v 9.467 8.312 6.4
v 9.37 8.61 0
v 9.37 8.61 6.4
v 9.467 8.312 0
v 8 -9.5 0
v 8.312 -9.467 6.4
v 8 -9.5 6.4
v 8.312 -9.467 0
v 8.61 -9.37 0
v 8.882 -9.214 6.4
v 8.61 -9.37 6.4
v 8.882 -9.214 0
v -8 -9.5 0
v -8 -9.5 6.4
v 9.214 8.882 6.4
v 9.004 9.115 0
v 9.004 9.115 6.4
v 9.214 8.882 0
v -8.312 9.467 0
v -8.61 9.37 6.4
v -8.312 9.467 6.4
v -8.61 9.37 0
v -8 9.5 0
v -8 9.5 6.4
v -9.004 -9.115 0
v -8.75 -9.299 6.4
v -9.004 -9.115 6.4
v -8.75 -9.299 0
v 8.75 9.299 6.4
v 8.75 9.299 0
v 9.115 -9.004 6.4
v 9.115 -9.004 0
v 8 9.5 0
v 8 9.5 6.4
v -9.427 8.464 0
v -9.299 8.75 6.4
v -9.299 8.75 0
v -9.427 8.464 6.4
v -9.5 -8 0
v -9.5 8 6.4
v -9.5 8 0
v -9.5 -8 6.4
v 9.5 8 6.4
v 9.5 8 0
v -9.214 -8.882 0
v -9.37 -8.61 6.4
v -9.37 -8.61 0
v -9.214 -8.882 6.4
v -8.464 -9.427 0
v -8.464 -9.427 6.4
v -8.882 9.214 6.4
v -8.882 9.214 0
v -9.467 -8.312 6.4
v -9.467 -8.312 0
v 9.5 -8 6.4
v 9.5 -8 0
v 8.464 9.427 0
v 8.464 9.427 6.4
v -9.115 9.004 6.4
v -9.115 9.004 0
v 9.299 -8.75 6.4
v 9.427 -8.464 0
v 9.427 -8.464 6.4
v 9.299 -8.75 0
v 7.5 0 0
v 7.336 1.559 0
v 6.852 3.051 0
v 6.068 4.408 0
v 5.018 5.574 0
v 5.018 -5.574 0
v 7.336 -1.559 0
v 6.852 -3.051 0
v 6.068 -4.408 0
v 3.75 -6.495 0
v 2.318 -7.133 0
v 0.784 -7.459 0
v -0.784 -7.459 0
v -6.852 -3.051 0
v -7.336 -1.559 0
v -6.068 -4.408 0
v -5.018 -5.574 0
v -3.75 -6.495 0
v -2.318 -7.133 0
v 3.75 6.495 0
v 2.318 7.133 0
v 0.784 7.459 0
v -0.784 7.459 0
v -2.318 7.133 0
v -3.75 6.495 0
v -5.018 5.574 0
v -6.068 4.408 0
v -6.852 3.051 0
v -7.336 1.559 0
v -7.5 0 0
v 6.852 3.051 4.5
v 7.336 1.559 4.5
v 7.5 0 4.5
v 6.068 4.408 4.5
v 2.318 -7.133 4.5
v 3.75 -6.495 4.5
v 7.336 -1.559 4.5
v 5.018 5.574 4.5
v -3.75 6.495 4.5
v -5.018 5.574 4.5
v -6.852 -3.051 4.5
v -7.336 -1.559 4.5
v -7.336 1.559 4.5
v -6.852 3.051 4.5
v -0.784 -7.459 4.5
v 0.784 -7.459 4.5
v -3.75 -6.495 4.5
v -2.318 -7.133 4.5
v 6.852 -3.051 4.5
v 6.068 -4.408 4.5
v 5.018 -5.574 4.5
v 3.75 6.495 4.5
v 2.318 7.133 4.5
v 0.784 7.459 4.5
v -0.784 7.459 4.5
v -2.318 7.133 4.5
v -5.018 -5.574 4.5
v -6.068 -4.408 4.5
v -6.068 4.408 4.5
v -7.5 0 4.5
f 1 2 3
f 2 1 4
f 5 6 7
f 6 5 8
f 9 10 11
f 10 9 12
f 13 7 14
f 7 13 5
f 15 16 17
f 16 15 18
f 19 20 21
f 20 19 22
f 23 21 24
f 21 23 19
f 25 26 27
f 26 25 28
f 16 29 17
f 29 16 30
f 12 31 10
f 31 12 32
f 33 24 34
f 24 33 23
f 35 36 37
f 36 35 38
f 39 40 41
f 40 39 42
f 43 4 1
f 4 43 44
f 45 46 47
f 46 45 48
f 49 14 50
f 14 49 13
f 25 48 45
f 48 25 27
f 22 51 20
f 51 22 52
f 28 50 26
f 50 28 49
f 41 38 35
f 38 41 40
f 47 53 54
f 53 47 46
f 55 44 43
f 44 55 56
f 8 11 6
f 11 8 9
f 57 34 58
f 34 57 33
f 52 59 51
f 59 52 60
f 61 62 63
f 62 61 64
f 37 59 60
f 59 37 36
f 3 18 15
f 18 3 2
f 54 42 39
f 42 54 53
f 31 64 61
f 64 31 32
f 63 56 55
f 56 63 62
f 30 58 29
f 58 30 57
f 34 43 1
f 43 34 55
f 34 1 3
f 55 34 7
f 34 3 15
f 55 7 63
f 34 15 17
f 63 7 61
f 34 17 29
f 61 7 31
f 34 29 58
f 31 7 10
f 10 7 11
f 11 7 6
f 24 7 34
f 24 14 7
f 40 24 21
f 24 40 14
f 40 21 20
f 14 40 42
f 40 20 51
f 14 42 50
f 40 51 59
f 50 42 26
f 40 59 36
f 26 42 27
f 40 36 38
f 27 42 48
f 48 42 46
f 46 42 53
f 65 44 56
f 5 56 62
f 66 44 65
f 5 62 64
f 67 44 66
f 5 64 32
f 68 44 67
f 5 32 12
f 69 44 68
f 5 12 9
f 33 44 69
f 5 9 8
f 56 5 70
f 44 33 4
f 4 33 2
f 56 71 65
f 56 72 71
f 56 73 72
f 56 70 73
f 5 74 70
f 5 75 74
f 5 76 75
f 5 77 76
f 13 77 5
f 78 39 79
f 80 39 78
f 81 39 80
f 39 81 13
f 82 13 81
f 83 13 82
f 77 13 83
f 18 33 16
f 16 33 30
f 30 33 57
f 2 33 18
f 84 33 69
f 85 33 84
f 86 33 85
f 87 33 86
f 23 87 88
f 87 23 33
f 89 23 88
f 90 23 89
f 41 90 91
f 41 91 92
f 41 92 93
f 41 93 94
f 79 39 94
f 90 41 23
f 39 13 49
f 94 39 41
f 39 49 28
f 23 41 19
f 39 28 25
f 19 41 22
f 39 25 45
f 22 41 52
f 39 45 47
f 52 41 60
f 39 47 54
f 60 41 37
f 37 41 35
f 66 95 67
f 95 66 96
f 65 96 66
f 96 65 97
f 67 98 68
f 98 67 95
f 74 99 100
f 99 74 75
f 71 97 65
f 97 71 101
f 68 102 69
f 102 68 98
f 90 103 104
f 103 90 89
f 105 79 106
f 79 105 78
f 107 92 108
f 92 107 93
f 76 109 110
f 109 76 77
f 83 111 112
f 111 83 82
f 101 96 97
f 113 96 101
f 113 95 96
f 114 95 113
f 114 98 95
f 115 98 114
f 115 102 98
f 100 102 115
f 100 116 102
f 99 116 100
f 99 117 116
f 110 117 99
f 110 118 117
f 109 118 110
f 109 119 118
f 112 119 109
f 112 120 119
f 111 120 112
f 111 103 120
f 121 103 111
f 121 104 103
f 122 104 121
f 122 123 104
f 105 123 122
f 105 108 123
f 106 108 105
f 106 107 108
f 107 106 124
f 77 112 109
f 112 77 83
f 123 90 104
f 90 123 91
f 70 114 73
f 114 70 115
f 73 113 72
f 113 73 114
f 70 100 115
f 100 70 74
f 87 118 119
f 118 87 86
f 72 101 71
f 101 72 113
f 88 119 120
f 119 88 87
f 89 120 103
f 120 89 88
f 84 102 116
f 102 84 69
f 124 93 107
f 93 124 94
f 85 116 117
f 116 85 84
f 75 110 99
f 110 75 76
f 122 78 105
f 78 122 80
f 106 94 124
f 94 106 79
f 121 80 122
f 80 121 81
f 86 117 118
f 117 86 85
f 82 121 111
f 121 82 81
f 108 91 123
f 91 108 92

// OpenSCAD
tile_size = 19;
tile_thickness = 6.4;
corner_radius = -1.5;
text_depth = 0.001;
score_txt_size=3.5;
letter_txt_size=9;
font="DejaVu Sans:style=Bold";

module letter(letter) {
  color("black")
    translate([0,1,tile_thickness - text_depth])
    linear_extrude(text_depth)
    text(letter, halign="center", valign="center", size=letter_txt_size, font=font);
}

module score(n) {
  color("black")
    translate([(tile_size/2)-1.5, -(tile_size/2)+1.5, tile_thickness - text_depth])
    linear_extrude(text_depth)
    text(n, halign="right", valign="bottom", size=score_txt_size, font=font);
}

module fillet(r) {
  offset(r = -r, $fn=30) {
    offset(delta = r) {
      children();
    }
  }
}

module blank() {
  difference() {
    linear_extrude(tile_thickness)
      fillet(r=corner_radius) {
        square(tile_size, center=true);
      }
    cylinder(h=4.5, r=7.5, $fn=30);
  }
}

letter = undef;
all = false;

// 2 blank tiles (scoring 0 points)
// 1 point: A ×19, N ×9, E ×8, I ×8, T ×5, U ×5, R ×4, O ×3, S ×3
// 2 points: K ×3, M ×3
// 3 points: D ×4, G ×3
// 4 points: L ×3, H ×2, P ×2
// 5 points: B ×4, Y ×2, F ×1, V ×1
// 8 points: C ×3, W ×1
// 10 points: J ×1, Z ×1
letters = [
  [undef, undef, 2],
  ["A", "1", 19],
  ["N", "1", 9],
  ["E", "1", 8],
  ["I", "1", 8],
  ["T", "1", 5],
  ["U", "1", 5],
  ["R", "1", 4],
  ["O", "1", 3],
  ["S", "1", 3],
  ["K", "2", 3],
  ["M", "2", 3],
  ["D", "3", 4],
  ["G", "3", 3],
  ["L", "4", 3],
  ["H", "4", 2],
  ["P", "4", 2],
  ["B", "5", 4],
  ["Y", "5", 2],
  ["F", "5", 1],
  ["V", "5", 1],
  ["C", "8", 3],
  ["W", "8", 1],
  ["J", "10", 1],
  ["Z", "10", 1]
];

module letter_tile(letter, score) {
    difference() 
    {
      blank();
      letter(letter);
      score(score);
    };
  }

module grid() {
  echo($children);
  x = round(sqrt($children));
  for( i = [ 0 : $children - 1 ] ) {
    echo(i);
    translate([i % x, floor(i / x), 0])
      children(i);
  }
}

module tile(letter, score) {
  if(letter == undef) blank();
  else letter_tile(letter, score);
}

if (all || (letter == undef && $preview)) {
  // generate a vector with each tile's letter and score
  defs = [
    for(k = [ 0 : len(letters) - 1 ]) 
      for ( i = [ 1 : letters[k][2] ] ) 
        [letters[k][0], letters[k][1]]
  ];
  x = round(sqrt(len(defs)));
  // lay them out in a grid
  for( i = [ 0 : len(defs) - 1 ] ) {
    translate([
        i % x * (tile_size + 1), 
        floor(i / x) * (tile_size + 1),
        0]) 
      tile(defs[i][0], defs[i][1]);
  }
} else {
  if (letter == undef) {
    blank();
  } else {
    index = search(letter, letters);
    tile=letters[index[0]];
    letter_tile(tile[0], tile[1]);
  }
}
